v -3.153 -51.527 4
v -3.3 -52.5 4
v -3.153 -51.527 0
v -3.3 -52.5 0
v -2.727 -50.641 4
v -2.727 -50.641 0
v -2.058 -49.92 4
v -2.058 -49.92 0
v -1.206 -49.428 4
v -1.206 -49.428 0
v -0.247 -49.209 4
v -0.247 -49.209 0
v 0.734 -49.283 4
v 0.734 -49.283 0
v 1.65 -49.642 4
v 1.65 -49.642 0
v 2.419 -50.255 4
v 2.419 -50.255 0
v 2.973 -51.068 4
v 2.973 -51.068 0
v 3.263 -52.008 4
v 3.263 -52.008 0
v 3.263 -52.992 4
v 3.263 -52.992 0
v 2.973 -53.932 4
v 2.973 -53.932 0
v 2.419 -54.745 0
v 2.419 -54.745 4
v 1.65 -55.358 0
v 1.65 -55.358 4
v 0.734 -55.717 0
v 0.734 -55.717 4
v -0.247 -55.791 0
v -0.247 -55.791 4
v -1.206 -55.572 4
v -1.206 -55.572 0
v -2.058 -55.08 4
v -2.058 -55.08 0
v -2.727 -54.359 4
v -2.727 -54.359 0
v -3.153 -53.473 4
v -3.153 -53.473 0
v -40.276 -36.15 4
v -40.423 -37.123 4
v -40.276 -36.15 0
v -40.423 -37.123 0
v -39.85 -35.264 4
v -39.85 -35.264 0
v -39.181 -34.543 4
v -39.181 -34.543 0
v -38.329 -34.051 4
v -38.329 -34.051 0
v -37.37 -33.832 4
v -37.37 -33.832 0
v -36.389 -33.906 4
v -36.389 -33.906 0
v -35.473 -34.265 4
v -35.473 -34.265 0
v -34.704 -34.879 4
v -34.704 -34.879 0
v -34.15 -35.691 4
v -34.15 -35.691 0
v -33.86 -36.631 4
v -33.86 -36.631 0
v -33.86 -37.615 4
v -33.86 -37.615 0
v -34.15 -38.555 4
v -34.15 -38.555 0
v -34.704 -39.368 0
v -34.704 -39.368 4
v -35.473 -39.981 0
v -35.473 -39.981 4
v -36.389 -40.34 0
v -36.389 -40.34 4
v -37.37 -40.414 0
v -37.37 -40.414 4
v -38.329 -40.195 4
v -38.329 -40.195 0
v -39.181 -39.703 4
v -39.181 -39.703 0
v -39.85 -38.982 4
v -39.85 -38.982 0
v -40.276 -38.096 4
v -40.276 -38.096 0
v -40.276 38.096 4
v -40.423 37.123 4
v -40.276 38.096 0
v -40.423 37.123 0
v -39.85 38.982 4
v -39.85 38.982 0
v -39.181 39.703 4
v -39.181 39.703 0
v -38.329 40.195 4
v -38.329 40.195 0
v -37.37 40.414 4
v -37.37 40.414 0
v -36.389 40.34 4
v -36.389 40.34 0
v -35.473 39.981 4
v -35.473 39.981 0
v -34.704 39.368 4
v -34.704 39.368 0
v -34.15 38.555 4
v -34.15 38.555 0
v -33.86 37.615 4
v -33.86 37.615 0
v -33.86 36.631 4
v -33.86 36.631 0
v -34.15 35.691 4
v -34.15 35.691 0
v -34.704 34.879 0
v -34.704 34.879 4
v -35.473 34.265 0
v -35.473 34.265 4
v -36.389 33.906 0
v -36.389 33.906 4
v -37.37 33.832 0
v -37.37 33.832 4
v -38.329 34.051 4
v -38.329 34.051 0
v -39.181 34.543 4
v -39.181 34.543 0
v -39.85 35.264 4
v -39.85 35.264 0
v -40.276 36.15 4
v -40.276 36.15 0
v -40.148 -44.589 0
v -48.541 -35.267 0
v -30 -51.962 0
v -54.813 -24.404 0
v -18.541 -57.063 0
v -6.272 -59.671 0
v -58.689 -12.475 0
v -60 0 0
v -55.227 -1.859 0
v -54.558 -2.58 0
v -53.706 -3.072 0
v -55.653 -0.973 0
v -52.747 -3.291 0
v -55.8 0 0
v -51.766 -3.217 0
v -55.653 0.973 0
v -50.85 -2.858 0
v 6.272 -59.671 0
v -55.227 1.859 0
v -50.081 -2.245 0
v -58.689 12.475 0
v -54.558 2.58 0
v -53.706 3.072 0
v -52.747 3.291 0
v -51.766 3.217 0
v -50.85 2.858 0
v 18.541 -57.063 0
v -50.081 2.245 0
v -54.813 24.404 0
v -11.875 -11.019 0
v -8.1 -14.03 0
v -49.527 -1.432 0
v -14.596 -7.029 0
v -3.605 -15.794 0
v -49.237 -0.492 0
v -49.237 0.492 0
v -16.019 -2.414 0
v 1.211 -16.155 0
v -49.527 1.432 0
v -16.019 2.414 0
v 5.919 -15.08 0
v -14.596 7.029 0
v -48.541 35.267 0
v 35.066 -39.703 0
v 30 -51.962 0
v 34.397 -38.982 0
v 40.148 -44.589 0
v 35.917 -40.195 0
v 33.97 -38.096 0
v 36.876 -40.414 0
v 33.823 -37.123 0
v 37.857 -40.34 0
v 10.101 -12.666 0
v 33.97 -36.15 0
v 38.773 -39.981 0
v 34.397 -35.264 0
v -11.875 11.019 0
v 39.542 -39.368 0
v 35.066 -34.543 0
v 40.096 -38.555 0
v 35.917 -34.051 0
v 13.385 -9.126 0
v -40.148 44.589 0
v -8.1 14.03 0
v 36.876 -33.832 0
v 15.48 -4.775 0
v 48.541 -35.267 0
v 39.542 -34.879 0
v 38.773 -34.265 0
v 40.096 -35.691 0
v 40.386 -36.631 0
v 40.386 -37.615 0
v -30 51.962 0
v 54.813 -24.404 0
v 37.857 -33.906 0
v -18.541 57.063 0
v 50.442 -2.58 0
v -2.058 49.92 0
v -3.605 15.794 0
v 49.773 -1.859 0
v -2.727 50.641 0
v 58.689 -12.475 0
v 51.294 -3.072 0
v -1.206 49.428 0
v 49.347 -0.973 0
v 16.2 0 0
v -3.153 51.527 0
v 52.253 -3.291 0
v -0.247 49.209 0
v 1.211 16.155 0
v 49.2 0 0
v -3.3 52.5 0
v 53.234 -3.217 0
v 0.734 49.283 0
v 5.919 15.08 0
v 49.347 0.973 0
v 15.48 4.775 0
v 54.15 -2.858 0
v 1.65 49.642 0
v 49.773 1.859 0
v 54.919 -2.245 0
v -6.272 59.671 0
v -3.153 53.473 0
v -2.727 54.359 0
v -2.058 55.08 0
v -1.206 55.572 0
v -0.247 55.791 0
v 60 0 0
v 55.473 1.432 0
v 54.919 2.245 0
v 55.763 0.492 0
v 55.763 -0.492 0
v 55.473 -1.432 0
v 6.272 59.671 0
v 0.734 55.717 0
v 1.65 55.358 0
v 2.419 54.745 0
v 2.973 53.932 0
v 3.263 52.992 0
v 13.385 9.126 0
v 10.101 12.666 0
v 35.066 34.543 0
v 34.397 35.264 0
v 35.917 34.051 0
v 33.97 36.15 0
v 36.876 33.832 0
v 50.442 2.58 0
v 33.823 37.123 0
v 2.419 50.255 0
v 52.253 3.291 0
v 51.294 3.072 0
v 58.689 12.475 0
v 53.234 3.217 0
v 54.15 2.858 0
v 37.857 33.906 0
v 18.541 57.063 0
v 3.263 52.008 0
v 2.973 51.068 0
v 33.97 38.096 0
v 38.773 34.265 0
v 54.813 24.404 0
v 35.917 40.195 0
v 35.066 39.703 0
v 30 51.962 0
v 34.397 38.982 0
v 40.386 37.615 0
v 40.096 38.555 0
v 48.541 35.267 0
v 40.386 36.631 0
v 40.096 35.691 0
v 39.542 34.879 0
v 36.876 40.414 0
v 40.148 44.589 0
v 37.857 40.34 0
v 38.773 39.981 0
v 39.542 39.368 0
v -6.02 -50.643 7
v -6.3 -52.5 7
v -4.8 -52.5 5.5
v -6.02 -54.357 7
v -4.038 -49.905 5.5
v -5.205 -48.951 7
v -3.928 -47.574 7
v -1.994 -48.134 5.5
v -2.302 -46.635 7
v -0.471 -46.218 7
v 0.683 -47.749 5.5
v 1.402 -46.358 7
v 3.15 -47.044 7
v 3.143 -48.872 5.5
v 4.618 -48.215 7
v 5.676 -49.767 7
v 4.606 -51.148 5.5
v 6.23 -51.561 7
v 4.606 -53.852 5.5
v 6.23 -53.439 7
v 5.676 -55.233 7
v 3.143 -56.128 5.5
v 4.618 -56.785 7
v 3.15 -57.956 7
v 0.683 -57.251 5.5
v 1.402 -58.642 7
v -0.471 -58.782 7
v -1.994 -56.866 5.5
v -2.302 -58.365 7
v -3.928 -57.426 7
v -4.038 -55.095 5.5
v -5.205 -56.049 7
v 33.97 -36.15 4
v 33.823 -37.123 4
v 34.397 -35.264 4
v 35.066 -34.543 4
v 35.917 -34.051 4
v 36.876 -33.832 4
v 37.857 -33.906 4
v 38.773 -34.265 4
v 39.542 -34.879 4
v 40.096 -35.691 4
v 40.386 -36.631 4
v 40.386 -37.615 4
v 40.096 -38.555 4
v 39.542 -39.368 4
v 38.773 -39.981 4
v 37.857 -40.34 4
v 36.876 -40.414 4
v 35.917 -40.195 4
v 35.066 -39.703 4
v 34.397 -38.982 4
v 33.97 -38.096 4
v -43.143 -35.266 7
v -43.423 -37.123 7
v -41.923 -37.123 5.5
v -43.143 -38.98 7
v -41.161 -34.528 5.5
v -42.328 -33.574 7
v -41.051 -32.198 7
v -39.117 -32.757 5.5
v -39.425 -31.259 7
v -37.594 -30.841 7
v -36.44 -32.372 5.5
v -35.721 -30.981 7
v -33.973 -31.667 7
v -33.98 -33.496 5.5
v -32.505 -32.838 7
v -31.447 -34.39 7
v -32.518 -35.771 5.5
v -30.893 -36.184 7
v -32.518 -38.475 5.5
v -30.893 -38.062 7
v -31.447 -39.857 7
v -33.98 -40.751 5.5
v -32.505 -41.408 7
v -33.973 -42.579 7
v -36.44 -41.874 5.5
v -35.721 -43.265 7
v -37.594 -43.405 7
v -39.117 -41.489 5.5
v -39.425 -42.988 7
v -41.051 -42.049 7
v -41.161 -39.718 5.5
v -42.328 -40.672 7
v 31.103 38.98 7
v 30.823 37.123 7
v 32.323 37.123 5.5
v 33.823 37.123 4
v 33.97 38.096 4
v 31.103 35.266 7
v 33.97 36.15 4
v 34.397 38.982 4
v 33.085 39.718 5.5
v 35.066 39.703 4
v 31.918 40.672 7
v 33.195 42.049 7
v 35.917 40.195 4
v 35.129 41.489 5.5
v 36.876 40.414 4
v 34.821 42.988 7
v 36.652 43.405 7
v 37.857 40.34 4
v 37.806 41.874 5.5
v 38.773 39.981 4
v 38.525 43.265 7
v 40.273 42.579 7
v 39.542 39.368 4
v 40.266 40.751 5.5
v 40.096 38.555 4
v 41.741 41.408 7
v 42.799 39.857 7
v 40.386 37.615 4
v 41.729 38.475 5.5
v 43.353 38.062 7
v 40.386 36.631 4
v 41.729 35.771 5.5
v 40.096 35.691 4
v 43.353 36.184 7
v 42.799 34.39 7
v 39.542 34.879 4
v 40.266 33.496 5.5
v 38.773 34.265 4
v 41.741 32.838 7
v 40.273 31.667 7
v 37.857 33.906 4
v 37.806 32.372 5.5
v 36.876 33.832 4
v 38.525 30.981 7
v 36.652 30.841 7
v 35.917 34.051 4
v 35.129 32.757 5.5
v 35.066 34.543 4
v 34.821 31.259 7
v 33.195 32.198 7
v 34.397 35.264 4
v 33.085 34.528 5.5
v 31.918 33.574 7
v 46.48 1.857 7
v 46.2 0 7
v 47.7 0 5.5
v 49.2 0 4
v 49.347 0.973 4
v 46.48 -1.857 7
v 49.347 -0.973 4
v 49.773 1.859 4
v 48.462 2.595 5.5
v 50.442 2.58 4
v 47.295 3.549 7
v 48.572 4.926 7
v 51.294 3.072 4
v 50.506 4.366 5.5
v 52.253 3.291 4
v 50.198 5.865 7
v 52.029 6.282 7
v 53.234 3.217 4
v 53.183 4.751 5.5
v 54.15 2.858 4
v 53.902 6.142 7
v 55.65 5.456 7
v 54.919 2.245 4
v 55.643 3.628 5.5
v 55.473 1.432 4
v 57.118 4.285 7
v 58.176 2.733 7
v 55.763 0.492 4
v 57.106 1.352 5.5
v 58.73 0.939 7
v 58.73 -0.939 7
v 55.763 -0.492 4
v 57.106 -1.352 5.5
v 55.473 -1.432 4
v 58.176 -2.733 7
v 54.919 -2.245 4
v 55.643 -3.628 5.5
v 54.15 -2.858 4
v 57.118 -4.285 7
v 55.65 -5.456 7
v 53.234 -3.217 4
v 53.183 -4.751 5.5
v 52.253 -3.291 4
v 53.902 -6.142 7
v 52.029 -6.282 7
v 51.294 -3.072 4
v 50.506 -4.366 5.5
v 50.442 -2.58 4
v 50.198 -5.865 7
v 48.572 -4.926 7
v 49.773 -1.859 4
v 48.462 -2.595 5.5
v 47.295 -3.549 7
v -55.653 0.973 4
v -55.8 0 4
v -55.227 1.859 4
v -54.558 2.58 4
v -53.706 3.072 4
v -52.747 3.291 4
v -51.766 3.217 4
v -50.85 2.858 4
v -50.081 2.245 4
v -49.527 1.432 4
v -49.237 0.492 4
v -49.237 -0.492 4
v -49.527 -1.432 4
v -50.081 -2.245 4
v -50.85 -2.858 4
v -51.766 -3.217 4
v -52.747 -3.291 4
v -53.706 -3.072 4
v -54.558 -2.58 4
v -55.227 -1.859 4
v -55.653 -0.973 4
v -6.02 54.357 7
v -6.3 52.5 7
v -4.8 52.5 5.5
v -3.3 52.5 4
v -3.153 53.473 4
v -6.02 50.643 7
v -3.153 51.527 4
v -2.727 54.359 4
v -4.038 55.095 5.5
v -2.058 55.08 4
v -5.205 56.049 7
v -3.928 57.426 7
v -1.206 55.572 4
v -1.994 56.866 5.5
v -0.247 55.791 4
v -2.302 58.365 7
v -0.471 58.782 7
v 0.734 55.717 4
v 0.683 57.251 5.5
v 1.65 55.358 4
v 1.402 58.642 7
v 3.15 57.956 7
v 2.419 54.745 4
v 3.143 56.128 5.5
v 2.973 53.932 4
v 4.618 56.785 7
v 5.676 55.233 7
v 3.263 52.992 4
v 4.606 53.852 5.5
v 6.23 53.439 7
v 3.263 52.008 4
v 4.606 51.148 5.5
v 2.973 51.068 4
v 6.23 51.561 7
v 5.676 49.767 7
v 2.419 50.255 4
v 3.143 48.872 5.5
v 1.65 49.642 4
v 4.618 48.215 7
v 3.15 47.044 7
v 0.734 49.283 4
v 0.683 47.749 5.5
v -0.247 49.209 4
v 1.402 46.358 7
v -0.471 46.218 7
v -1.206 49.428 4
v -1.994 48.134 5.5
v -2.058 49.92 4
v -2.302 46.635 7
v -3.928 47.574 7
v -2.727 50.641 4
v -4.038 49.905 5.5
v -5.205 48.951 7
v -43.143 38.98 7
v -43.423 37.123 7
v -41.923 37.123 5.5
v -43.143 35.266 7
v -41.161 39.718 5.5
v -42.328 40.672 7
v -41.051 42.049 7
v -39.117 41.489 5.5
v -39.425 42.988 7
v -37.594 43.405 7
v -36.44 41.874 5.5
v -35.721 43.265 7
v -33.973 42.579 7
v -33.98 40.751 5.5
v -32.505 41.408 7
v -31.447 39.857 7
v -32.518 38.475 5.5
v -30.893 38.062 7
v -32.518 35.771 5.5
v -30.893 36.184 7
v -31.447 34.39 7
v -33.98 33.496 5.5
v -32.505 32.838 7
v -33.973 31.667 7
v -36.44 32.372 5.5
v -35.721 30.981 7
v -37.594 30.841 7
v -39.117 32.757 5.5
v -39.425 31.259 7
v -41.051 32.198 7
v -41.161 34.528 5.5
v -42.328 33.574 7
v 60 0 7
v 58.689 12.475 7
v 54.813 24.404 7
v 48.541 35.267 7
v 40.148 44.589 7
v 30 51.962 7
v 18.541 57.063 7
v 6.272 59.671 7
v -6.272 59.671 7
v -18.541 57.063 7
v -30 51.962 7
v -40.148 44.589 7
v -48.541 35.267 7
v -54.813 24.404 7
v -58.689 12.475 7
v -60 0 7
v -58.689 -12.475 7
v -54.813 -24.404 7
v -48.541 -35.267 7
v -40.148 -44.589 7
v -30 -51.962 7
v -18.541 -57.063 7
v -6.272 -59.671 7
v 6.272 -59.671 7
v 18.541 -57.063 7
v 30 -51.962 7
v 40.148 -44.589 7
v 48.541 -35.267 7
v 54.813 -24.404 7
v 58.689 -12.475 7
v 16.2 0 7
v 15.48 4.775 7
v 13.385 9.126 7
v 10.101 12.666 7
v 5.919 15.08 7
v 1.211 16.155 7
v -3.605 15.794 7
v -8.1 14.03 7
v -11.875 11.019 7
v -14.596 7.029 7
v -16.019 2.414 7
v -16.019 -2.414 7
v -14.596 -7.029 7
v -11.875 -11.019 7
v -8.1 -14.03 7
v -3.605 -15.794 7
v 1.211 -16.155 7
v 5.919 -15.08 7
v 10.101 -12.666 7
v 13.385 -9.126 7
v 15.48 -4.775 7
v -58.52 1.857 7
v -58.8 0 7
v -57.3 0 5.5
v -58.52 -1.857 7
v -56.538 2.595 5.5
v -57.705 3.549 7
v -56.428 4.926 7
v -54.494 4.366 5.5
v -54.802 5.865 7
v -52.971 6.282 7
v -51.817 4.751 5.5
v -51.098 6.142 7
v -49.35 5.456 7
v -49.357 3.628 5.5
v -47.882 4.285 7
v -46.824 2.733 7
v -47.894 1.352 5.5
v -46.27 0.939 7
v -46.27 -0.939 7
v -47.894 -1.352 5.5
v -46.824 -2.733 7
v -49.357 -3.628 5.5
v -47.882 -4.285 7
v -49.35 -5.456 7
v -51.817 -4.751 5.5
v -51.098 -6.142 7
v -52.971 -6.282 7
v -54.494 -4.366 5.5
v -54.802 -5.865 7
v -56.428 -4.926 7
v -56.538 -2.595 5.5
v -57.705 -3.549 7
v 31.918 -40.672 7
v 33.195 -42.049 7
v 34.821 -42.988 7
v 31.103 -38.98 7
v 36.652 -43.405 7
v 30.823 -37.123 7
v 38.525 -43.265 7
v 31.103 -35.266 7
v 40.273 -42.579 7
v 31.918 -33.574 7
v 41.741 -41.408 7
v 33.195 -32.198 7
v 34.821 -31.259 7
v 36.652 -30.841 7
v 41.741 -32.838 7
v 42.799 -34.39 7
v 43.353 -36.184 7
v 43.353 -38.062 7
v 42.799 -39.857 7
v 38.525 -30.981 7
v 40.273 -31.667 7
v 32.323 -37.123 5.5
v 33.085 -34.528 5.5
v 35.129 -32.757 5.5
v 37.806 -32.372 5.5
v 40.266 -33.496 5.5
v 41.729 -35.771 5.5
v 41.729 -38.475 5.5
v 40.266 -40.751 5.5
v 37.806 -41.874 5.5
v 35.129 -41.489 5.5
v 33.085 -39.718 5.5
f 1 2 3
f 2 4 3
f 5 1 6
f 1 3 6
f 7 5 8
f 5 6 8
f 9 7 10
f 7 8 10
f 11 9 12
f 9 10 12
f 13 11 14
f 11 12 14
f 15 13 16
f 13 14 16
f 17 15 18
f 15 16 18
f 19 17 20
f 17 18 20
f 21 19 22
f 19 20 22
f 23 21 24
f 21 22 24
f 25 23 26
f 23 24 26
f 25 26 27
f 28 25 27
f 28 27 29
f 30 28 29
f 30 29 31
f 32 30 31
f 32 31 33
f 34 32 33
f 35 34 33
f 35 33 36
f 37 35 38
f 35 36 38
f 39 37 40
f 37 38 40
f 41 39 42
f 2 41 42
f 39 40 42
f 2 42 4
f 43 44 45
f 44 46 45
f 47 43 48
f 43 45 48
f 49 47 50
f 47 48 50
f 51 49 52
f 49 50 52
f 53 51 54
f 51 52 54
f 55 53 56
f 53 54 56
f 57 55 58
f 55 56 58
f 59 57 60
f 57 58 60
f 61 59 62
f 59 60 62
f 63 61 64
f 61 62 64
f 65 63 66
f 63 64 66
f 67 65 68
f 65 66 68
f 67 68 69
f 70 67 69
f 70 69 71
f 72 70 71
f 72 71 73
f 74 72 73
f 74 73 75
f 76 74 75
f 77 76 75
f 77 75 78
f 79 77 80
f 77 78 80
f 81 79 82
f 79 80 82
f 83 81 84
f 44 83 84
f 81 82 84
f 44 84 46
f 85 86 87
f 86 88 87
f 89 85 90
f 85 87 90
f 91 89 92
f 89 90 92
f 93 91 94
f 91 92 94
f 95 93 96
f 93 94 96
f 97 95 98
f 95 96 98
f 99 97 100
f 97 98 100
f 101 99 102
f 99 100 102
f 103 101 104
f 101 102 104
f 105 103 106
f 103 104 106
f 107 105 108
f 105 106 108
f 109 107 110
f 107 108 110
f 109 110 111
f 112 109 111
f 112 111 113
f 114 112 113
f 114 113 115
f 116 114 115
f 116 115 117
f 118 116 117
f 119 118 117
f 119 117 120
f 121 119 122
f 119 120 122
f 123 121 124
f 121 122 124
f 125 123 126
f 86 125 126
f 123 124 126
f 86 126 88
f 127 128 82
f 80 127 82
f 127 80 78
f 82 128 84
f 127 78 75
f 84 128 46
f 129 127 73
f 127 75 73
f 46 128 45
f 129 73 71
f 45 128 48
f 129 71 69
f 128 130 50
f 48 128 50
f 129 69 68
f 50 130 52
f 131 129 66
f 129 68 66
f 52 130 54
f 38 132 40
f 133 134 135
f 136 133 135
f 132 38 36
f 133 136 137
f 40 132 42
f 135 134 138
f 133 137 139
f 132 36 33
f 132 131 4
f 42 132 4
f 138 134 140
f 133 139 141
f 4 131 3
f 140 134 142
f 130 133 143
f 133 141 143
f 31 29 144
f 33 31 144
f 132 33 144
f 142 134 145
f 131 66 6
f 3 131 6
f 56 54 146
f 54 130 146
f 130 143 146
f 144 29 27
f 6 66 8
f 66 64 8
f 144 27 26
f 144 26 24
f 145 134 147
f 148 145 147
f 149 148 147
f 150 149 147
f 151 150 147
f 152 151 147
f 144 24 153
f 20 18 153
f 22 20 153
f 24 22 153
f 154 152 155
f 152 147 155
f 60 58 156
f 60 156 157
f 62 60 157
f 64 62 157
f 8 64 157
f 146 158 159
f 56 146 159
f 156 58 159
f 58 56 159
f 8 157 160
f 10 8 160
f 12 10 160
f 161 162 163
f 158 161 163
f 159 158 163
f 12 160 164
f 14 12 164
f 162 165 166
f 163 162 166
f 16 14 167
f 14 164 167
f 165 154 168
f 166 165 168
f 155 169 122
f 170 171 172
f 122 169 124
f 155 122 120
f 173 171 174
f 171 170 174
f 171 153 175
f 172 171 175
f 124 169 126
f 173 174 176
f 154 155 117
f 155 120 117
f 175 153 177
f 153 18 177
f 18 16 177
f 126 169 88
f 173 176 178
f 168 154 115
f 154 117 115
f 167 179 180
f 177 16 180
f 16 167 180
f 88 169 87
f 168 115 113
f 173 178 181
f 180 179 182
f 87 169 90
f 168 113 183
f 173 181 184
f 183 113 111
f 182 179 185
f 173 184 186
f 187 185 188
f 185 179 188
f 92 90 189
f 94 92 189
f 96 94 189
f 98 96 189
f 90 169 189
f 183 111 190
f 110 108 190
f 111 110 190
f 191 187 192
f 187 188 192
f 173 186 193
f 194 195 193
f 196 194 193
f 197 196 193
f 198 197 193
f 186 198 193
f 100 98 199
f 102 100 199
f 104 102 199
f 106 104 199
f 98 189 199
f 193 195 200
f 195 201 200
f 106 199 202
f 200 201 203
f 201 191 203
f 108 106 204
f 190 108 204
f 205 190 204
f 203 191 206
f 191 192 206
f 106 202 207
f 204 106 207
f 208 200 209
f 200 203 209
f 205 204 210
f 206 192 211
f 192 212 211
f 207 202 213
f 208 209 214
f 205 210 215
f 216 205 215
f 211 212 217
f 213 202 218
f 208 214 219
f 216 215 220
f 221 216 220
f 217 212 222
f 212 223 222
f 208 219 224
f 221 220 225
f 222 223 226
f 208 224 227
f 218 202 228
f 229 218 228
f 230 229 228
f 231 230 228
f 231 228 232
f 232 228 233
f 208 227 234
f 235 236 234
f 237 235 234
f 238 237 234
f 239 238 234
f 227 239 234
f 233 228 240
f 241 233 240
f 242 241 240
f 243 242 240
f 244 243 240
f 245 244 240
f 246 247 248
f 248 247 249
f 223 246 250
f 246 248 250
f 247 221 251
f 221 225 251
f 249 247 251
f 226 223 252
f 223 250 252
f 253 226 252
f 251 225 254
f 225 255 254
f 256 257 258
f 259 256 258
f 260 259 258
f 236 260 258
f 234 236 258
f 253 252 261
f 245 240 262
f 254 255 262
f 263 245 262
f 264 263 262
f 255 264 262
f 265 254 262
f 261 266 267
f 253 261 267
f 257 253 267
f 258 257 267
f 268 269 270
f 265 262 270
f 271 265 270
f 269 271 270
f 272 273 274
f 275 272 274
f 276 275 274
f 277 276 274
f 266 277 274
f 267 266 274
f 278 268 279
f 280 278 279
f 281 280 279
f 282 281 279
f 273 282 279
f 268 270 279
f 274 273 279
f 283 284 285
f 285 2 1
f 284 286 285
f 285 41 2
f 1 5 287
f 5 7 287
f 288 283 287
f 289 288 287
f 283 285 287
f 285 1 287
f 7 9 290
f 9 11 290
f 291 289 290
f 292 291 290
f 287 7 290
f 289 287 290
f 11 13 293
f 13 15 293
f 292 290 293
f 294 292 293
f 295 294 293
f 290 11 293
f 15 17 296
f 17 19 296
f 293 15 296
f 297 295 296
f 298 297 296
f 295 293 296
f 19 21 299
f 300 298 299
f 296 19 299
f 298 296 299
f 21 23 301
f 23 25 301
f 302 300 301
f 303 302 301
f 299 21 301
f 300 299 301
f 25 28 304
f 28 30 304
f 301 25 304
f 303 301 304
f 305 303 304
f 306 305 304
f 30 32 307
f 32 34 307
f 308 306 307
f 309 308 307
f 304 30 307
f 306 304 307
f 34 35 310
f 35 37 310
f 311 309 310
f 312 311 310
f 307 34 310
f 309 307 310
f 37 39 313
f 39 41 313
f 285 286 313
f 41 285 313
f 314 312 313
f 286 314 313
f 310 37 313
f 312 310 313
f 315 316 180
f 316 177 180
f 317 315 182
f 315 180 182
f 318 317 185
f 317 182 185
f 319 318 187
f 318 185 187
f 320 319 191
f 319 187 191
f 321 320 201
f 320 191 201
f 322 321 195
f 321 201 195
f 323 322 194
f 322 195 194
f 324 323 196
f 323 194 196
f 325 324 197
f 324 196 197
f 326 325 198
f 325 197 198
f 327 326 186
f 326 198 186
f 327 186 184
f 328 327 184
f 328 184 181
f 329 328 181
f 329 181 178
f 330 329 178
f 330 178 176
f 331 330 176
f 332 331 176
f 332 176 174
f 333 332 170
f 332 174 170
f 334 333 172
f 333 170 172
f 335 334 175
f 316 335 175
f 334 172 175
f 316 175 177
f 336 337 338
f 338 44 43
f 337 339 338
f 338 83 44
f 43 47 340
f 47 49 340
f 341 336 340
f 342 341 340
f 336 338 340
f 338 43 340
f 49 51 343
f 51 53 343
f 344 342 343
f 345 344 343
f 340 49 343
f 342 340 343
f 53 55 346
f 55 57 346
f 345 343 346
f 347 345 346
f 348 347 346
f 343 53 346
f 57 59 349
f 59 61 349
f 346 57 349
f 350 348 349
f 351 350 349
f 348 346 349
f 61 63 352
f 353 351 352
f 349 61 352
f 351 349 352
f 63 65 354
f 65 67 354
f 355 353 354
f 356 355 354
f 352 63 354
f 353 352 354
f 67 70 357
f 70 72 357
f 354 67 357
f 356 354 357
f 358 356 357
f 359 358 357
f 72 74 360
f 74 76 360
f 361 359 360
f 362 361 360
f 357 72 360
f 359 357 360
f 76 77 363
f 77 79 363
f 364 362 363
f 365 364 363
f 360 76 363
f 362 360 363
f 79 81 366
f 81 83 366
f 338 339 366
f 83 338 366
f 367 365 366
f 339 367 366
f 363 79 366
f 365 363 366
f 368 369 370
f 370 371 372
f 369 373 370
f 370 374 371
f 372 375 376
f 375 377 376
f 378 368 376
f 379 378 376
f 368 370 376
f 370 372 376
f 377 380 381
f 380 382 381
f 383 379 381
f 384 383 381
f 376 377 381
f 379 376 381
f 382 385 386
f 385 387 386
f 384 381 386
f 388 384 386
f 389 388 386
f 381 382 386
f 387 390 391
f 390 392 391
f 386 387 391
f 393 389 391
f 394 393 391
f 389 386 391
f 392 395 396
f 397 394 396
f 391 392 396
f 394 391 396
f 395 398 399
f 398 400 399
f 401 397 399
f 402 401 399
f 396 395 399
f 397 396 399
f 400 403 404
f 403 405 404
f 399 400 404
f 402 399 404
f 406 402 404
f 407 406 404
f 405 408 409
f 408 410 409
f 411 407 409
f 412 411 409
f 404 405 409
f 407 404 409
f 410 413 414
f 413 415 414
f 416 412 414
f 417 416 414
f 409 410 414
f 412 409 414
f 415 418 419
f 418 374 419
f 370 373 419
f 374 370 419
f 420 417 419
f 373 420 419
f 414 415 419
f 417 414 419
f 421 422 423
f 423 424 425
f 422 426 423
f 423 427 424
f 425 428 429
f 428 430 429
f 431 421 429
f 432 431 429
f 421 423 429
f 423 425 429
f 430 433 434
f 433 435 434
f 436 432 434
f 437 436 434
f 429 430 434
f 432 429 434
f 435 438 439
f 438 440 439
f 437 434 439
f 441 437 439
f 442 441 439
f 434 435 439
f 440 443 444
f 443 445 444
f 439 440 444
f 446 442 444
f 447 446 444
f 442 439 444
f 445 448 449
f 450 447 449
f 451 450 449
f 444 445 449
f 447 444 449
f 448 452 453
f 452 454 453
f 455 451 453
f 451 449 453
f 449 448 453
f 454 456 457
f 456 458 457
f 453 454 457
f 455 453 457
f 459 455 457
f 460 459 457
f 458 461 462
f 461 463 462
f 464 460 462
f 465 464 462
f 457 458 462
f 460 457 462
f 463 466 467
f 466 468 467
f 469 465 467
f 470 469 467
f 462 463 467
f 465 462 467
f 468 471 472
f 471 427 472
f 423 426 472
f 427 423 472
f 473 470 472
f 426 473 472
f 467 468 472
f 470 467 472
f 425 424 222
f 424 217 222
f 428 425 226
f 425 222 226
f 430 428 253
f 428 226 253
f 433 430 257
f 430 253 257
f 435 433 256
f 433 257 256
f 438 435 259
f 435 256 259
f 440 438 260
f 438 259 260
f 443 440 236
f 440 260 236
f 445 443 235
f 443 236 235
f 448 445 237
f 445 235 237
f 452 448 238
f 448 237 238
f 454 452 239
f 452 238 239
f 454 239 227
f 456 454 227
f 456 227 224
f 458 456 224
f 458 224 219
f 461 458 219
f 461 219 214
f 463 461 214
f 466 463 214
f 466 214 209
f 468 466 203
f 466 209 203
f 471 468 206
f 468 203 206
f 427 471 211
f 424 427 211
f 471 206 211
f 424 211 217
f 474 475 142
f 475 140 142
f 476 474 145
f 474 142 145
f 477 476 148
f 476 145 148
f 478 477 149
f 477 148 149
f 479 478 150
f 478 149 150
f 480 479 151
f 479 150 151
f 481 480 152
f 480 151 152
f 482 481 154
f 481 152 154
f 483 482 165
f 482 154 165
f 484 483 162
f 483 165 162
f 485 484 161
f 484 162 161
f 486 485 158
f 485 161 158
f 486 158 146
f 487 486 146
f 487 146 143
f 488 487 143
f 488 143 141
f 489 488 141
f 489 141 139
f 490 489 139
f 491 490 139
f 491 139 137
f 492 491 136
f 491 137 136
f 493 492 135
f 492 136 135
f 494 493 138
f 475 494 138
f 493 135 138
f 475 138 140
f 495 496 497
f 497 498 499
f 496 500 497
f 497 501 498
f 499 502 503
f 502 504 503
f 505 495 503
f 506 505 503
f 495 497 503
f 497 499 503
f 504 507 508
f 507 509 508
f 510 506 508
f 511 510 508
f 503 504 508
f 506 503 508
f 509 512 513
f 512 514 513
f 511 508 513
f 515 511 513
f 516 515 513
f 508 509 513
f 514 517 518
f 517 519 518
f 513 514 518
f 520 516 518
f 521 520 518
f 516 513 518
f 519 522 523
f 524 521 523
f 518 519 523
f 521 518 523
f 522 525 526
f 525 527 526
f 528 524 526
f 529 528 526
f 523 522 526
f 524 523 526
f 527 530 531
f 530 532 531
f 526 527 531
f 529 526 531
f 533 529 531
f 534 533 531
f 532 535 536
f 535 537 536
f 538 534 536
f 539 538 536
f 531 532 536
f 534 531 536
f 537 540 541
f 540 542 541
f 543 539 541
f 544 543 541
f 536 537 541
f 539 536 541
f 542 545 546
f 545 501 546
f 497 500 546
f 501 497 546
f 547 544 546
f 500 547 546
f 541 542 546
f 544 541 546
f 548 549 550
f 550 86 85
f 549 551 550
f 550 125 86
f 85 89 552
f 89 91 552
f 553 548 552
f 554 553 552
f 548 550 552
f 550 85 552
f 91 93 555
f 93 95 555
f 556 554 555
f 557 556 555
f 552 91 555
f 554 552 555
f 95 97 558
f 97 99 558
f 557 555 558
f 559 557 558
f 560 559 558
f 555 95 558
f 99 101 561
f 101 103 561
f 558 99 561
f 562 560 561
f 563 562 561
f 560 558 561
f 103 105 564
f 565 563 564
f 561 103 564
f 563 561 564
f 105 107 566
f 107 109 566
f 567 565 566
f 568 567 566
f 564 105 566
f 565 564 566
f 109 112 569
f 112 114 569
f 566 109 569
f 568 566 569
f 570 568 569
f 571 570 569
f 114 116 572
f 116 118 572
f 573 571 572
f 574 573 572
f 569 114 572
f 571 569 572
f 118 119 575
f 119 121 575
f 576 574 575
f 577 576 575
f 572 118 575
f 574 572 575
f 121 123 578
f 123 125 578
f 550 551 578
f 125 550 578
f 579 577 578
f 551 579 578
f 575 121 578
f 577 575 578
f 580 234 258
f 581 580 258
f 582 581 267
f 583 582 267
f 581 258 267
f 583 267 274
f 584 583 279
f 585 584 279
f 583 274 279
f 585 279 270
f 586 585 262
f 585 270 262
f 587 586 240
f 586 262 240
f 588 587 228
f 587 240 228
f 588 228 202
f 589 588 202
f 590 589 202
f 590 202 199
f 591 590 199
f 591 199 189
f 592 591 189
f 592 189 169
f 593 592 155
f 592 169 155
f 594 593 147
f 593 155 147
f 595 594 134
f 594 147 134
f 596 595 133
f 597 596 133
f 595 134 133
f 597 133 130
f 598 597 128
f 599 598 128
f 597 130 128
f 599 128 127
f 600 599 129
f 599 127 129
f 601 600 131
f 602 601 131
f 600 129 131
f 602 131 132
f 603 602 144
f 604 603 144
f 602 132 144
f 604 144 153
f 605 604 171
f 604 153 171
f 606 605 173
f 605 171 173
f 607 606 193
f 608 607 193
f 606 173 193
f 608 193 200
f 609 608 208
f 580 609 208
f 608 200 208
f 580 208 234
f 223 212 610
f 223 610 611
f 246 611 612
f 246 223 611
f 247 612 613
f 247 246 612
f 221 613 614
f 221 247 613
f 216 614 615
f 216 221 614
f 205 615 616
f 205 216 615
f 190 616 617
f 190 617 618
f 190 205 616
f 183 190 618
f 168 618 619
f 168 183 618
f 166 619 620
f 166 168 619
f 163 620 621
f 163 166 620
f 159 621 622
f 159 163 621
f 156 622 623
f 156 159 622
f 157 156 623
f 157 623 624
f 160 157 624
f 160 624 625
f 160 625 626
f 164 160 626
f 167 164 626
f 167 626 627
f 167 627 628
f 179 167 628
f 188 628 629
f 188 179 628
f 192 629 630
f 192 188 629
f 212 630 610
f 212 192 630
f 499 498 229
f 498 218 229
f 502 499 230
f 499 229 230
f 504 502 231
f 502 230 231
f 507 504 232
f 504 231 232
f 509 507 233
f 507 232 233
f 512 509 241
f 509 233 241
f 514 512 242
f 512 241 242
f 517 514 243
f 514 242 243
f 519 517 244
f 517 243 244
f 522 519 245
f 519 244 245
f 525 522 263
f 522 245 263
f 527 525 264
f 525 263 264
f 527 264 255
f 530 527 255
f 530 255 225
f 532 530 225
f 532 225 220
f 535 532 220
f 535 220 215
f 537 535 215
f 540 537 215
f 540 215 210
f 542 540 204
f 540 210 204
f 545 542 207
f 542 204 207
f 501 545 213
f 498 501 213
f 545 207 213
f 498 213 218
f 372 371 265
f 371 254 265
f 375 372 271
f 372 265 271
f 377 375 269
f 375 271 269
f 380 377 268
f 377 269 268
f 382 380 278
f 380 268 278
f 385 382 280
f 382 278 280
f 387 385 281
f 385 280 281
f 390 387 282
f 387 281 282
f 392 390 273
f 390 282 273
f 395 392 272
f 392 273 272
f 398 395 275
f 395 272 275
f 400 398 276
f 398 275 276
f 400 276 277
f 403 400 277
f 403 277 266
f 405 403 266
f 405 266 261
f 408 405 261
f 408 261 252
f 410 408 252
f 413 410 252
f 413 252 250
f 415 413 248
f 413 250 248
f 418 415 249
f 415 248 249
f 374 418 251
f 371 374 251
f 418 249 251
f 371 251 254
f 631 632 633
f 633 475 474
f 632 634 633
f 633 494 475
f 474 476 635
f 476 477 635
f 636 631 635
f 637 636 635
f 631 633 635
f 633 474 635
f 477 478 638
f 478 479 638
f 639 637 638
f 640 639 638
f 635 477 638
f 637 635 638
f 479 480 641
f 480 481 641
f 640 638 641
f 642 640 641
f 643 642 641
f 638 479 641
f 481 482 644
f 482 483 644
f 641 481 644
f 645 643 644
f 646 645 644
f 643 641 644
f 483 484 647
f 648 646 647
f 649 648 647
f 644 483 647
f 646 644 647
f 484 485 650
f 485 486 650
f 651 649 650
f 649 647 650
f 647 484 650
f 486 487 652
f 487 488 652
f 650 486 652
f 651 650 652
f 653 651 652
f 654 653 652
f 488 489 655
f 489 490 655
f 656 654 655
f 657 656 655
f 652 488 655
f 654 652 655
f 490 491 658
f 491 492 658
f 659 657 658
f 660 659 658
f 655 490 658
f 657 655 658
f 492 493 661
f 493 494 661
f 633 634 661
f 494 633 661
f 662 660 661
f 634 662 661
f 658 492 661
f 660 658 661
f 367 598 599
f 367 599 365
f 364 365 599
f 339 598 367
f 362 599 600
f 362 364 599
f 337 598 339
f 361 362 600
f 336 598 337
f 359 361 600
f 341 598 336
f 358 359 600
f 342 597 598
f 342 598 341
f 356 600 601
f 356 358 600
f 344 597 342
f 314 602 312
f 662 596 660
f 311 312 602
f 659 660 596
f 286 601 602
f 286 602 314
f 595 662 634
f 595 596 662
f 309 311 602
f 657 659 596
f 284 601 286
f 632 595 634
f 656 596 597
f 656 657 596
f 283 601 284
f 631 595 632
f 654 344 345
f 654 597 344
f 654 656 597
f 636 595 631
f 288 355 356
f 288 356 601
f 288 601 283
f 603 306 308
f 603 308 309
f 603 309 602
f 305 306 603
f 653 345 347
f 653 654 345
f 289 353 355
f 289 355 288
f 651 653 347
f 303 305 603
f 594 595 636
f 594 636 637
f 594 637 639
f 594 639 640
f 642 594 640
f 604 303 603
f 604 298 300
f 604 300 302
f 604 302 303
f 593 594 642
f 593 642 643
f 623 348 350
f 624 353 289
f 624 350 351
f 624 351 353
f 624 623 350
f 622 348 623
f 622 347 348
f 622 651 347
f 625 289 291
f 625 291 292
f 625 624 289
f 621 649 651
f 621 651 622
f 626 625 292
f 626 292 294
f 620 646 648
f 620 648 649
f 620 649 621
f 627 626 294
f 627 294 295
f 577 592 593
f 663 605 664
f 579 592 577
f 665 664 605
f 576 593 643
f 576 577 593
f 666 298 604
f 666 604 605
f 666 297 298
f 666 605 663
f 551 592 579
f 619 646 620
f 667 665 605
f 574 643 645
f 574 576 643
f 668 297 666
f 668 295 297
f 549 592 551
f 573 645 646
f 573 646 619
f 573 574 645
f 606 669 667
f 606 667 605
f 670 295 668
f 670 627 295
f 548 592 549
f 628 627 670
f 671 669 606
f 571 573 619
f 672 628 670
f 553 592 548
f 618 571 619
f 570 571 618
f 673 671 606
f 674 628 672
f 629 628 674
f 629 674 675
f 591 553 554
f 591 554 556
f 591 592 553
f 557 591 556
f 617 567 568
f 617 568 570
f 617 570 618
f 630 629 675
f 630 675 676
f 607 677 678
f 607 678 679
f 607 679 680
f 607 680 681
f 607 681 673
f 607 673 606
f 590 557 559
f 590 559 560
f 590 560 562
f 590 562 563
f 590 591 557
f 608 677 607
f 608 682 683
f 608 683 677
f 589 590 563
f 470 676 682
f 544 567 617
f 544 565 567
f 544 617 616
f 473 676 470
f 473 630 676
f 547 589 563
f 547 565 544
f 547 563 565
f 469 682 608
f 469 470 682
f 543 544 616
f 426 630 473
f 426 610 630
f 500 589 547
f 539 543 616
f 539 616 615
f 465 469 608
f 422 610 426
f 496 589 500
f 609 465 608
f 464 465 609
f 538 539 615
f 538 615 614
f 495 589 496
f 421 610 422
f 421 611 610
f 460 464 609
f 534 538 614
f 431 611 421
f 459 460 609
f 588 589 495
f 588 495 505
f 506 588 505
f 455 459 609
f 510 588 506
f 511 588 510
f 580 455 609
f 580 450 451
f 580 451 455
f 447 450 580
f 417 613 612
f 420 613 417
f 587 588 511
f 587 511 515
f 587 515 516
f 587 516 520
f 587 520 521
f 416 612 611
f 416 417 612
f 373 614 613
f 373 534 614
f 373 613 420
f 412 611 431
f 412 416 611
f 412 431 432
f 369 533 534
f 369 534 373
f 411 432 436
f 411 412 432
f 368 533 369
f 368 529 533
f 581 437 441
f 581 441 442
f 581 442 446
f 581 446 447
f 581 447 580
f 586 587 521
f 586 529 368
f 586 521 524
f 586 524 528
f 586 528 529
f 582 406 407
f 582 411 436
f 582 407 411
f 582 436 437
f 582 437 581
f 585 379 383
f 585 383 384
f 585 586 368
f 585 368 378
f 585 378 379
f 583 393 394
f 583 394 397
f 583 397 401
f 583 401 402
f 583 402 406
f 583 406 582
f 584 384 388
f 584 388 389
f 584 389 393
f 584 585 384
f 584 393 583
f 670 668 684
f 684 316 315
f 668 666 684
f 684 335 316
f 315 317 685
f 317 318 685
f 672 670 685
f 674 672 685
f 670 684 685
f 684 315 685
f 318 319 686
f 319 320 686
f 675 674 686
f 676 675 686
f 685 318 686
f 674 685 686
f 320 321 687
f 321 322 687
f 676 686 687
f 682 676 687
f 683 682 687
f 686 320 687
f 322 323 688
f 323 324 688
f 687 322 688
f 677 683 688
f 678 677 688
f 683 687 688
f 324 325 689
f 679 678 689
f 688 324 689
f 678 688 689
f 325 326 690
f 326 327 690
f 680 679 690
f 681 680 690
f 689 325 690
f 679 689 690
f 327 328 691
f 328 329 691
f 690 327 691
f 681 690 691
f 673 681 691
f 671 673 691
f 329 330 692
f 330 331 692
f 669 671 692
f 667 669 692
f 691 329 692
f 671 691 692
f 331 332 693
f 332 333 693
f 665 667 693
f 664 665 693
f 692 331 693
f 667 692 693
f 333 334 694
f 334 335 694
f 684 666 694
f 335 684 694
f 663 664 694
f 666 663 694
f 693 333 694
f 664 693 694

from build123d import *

# Parameters (mm, degrees)
SKETCH1_R                                           = 60
SKETCH1_R_2                                         = 16.2
BOSS_EXTRUDE1_DEPTH                                 = 7
CSK_FOR_M6_COUNTERSUNK_FLAT_HEAD_SCREW1_D           = 6.6
CSK_FOR_M6_COUNTERSUNK_FLAT_HEAD_SCREW1_CSINK_D     = 12.6
CSK_FOR_M6_COUNTERSUNK_FLAT_HEAD_SCREW1_CSINK_ANGLE = 90


with BuildPart() as part:
    # Sketch1 → Boss-Extrude1 (new body)
    with BuildSketch(Plane.XY):
        Circle(SKETCH1_R)
        Circle(SKETCH1_R_2, mode=Mode.SUBTRACT)
    extrude(amount=BOSS_EXTRUDE1_DEPTH)

    # CSK for M6 Countersunk Flat Head Screw1 (through all)
    with Locations(Plane.XY.offset(7)):
        with Locations((-37.123106012, 37.123106012), (0, 52.5), (37.123106012, 37.123106012), (52.5, 0), (37.123106012, -37.123106012), (0, -52.5), (-37.123106012, -37.123106012), (-52.5, 0)):
            CounterSinkHole(CSK_FOR_M6_COUNTERSUNK_FLAT_HEAD_SCREW1_D / 2, CSK_FOR_M6_COUNTERSUNK_FLAT_HEAD_SCREW1_CSINK_D / 2, counter_sink_angle=CSK_FOR_M6_COUNTERSUNK_FLAT_HEAD_SCREW1_CSINK_ANGLE)


solid = part.part
